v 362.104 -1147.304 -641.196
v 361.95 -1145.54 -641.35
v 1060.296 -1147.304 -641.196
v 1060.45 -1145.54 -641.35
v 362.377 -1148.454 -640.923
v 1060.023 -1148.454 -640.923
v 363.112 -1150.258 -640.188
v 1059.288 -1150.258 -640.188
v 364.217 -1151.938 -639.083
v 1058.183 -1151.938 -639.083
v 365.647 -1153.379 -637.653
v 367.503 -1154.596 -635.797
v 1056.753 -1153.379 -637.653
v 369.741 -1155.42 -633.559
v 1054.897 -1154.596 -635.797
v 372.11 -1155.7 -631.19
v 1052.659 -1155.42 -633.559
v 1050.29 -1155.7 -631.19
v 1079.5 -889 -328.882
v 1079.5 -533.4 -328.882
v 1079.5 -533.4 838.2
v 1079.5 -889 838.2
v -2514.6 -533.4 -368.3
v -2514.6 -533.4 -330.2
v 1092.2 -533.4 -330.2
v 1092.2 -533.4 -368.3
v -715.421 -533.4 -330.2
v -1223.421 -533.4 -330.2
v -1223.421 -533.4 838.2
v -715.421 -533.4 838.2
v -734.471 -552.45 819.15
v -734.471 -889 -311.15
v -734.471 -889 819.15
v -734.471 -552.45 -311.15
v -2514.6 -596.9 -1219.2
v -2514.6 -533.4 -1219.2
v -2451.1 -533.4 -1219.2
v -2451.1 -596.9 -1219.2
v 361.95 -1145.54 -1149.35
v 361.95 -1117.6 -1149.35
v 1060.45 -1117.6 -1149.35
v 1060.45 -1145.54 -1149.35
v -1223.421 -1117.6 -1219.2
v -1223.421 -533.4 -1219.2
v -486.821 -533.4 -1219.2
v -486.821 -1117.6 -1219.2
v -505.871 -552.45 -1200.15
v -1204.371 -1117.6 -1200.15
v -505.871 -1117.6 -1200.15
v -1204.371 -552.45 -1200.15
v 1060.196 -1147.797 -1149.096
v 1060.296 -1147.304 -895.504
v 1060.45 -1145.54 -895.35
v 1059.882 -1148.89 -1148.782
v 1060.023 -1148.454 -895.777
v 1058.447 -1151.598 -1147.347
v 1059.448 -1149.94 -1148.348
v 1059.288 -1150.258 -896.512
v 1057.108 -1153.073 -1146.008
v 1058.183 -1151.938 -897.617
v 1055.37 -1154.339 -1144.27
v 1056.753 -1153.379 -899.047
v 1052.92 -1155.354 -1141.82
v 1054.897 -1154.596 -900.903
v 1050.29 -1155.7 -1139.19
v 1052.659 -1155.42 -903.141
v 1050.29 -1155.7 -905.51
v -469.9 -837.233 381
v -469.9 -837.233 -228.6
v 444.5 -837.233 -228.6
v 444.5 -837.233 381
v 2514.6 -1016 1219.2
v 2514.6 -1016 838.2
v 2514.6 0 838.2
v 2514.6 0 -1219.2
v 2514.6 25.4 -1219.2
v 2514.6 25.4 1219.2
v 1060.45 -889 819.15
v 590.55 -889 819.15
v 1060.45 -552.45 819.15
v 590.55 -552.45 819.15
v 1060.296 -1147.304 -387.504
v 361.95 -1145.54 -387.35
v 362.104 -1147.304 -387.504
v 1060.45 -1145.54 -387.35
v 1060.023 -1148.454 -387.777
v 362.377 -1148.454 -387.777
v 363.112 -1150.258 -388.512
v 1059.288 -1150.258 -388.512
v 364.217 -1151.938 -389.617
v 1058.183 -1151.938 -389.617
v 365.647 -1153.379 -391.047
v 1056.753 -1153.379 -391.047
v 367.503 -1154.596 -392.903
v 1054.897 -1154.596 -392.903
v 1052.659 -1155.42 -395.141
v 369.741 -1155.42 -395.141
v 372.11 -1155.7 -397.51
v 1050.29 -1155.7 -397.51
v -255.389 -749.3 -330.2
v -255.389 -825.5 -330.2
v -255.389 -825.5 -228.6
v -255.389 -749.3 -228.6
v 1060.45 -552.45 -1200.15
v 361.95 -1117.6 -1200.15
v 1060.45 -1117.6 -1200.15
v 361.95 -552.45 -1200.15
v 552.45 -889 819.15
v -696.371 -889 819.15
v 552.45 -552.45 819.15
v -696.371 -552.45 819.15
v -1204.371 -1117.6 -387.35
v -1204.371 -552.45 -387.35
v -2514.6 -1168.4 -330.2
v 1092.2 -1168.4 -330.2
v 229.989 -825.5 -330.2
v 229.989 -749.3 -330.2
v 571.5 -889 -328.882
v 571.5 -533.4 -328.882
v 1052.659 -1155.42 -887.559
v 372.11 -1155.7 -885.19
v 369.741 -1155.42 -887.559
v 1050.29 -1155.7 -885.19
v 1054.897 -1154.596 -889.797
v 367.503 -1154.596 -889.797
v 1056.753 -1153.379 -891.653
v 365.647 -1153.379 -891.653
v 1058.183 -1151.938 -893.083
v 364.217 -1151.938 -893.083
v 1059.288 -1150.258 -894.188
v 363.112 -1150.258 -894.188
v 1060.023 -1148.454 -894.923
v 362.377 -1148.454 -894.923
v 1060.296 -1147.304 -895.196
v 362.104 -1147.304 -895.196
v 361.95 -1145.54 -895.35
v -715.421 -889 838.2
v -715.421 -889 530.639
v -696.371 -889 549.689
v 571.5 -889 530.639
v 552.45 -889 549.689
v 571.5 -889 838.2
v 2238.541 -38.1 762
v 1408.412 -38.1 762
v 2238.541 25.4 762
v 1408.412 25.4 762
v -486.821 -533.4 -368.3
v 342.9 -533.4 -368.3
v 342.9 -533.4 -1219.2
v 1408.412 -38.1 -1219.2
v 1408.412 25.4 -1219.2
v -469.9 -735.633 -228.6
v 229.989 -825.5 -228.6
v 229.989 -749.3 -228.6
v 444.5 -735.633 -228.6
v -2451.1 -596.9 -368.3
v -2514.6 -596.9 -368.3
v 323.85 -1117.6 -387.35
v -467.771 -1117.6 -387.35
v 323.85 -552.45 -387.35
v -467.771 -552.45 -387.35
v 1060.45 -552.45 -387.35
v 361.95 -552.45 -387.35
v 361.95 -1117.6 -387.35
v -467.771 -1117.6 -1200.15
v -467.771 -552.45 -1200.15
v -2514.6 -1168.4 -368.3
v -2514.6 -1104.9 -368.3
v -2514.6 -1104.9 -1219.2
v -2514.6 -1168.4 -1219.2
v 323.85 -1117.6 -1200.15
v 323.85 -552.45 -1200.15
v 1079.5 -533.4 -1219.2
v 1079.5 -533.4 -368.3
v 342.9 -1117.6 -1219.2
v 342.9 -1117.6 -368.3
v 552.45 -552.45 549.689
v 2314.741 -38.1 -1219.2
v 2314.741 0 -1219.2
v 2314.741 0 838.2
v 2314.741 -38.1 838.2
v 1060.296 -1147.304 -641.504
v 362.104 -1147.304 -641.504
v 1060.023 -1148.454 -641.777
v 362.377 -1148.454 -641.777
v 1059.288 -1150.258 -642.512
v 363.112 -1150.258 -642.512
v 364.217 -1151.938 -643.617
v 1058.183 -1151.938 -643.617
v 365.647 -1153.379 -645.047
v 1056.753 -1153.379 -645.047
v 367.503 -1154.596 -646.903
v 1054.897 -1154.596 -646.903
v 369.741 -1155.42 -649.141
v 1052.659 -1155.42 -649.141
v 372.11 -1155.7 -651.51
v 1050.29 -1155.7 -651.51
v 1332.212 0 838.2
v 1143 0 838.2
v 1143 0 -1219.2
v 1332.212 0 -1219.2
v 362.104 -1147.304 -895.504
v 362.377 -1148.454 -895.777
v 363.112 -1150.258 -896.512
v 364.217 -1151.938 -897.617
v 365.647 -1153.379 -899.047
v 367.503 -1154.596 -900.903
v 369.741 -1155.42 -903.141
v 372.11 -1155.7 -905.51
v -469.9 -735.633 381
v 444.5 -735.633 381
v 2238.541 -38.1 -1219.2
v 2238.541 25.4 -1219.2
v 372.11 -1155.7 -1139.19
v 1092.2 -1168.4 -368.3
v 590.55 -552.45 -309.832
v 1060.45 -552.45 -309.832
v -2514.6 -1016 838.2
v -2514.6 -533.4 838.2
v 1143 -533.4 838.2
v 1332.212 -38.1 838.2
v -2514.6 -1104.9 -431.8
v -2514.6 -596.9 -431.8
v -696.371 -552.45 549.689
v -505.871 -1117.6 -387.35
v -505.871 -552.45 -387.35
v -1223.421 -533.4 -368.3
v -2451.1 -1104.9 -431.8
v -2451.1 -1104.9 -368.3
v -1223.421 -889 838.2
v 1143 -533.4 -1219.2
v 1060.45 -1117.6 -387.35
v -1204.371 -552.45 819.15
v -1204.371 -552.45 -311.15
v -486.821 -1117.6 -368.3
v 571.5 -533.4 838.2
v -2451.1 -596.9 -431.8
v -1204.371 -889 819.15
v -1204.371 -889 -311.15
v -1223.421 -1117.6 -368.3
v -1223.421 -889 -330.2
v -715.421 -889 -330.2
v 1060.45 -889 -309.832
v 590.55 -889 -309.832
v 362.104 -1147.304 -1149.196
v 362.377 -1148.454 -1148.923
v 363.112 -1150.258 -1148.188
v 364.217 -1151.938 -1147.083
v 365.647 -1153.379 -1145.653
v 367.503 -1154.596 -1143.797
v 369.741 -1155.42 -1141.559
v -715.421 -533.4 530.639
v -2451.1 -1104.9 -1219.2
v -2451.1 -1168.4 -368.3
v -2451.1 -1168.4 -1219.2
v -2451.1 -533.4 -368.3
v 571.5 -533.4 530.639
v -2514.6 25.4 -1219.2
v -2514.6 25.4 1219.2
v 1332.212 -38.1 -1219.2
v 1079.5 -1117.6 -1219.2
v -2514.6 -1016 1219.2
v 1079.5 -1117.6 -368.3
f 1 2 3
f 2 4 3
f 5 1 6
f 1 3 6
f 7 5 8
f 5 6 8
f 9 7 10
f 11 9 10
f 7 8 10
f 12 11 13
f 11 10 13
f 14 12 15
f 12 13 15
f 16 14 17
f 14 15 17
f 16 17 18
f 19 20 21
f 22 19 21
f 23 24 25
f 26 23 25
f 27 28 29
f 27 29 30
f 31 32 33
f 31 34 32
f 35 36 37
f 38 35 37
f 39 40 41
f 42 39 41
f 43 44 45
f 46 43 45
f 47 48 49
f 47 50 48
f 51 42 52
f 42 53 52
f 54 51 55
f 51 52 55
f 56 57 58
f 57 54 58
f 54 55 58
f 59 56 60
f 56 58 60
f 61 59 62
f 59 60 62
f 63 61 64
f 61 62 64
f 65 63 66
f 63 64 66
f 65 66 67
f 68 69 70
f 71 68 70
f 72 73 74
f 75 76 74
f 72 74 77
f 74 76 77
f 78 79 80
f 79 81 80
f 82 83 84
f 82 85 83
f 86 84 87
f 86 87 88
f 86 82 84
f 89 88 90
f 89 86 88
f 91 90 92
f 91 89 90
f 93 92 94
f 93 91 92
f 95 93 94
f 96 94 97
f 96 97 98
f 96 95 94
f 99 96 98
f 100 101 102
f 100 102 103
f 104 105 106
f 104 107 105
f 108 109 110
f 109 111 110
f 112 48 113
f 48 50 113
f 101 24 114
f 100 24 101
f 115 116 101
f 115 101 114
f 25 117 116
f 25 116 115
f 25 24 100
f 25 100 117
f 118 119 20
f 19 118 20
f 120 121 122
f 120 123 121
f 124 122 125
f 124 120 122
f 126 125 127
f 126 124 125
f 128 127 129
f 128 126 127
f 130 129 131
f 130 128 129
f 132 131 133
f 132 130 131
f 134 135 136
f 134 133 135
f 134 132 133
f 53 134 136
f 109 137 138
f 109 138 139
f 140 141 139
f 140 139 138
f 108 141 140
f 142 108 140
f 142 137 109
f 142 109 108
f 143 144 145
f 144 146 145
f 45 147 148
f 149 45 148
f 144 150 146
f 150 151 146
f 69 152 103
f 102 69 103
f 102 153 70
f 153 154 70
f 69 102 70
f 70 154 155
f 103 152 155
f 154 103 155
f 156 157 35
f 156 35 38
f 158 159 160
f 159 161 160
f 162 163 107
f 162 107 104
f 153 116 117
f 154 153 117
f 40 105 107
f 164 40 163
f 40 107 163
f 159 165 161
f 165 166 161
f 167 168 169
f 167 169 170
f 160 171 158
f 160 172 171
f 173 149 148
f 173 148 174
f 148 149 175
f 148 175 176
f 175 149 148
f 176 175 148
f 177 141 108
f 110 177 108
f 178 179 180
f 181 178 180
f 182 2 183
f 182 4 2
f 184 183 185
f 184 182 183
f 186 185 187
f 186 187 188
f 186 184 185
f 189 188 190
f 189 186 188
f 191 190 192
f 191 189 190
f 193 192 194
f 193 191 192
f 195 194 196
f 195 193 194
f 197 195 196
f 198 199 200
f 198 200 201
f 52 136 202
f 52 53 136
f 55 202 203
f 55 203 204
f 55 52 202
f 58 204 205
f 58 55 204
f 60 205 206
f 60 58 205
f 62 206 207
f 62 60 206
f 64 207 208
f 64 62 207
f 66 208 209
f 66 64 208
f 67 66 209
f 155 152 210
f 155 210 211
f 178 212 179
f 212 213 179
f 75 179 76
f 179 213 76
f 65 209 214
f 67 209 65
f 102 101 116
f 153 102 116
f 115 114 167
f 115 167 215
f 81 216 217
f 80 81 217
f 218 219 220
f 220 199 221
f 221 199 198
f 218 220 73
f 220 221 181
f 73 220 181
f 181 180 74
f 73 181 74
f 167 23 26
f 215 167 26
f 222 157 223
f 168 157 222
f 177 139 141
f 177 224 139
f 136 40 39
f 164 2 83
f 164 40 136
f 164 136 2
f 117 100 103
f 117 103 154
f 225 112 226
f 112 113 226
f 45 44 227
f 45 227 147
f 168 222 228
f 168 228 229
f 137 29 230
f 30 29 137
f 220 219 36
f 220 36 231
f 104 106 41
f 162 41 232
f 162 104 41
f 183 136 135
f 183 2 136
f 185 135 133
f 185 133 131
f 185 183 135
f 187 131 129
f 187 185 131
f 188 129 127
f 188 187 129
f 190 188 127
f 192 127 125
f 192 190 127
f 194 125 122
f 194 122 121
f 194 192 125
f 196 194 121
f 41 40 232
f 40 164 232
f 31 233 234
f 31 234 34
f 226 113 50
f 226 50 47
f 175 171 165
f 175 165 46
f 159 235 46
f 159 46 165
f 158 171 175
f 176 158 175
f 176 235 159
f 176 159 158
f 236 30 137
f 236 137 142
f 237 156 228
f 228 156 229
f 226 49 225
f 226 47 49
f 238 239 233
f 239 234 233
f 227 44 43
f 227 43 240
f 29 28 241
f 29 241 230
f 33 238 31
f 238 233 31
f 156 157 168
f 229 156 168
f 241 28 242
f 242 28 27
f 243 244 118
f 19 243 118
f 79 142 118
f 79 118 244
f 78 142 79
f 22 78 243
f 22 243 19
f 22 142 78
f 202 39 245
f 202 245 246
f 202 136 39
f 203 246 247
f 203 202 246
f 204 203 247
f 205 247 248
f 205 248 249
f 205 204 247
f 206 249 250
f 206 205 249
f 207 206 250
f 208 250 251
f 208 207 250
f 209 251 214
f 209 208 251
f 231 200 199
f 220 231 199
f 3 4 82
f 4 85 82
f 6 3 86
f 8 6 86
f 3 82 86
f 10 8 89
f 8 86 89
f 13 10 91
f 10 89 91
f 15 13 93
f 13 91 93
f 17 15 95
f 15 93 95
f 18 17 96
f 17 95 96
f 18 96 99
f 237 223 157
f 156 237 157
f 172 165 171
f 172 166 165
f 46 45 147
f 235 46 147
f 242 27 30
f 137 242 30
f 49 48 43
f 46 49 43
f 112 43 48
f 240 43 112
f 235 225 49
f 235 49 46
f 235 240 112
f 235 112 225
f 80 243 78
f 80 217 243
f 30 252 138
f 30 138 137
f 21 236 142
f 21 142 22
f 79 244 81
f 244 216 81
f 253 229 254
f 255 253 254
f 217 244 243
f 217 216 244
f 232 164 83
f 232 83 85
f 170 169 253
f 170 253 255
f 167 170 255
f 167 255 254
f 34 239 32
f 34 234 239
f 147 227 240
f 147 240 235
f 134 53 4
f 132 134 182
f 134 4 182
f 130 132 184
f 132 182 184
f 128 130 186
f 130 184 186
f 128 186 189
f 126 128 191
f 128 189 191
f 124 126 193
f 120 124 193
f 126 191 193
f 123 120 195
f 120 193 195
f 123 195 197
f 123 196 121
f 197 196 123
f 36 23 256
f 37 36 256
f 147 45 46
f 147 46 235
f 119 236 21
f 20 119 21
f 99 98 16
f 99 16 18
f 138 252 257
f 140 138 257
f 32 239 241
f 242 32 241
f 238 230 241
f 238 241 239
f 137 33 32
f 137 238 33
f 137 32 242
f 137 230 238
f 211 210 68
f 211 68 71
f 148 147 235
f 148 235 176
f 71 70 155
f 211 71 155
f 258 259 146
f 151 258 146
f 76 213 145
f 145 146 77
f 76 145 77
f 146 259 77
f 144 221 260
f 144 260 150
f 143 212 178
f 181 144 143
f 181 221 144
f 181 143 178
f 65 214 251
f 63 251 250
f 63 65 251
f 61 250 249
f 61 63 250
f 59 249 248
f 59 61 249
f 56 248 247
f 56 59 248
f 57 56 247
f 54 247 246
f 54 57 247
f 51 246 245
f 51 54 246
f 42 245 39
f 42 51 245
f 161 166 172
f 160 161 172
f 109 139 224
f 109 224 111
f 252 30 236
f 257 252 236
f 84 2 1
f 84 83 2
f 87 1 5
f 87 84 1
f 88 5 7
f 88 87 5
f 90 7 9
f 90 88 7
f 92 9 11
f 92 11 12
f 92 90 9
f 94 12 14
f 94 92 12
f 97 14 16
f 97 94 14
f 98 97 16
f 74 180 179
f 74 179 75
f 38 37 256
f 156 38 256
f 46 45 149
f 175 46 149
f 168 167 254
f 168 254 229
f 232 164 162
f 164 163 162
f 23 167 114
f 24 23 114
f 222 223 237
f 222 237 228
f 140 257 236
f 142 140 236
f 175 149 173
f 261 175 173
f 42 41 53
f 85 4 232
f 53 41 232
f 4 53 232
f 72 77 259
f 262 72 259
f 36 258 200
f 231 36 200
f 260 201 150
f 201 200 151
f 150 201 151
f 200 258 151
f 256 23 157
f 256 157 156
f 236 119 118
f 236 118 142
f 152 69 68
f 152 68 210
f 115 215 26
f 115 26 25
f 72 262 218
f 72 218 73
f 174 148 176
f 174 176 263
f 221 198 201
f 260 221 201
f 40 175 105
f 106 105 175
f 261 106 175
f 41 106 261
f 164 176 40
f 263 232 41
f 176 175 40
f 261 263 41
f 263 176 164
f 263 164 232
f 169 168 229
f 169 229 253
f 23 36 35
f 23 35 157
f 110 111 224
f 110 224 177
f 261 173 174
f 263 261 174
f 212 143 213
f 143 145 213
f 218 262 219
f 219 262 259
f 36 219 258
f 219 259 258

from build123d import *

# Parameters (mm, degrees)
F0_W      = 5029.2
F0_H      = 2438.4
F1_DEPTH  = 25.4
F2_W      = 3657.6
F2_H      = 2057.4
F3_DEPTH  = 533.4
F5_DEPTH  = 1016
F6_W      = 830.1289733465
F6_H      = 1981.2
F7_DEPTH  = 25.4
F9_DEPTH  = 38.1
F10_W     = 3606.8
F10_H     = 38.1
F11_DEPTH = 635
F12_W     = 63.5
F12_H     = 850.9
F13_DEPTH = 63.5
F14_W     = 508
F14_H     = 63.5
F15_DEPTH = 63.5
F17_DEPTH = 63.5
F18_W     = 736.6
F18_H     = 850.9
F19_DEPTH = 584.2
F20_T     = -19.05
F21_W     = 829.7205785751
F21_H     = 850.9
F22_DEPTH = 584.2
F23_T     = -19.05
F24_W     = 736.6
F24_H     = 850.9
F25_DEPTH = 584.2
F26_T     = -19.05
F27_W     = 698.5
F27_H     = 254
F28_DEPTH = 38.1
F29_W     = 485.3785143141
F29_H     = 76.2
F30_DEPTH = 101.6
F31_W     = 914.4
F31_H     = 101.6
F32_DEPTH = 609.6
F33_W     = 508
F33_H     = 1167.0816213608
F34_DEPTH = 355.6
F35_T     = -19.05
F36_W     = 508
F36_H     = 1168.4
F37_DEPTH = 355.6
F38_T     = -19.05
F39_W     = 1286.9205785751
F39_H     = 307.5614840508
F40_DEPTH = 355.6
F41_T     = -19.05
F42_R     = 10.16
F43_W     = 698.5
F43_H     = 254
F44_DEPTH = 38.1
F45_R     = 10.15999
F46_W     = 698.5
F46_H     = 254
F47_DEPTH = 38.1
F48_R     = 10.1599


# Not quite as in the source:
# - a fillet or chamfer is up to 0.001 mm smaller than in the source, because OpenCascade refuses the exact size


with BuildPart() as f1:
    # F0 (on Front) → F1 (new body)
    with BuildSketch(Plane.XZ):
        Rectangle(F0_W, F0_H)
    extrude(amount=-F1_DEPTH)

    # F2 (on face) → F3 (join)
    with BuildSketch(Plane.XZ):
        with Locations((-685.8, -190.5)):
            Rectangle(F2_W, F2_H)
    extrude(amount=F3_DEPTH)

    # F4 (on face) → F5 (join)
    with BuildSketch(Plane.XZ):
        Polygon((-2514.6, 1219.2), (-2514.6, 838.2), (1143, 838.2), (2514.6, 838.2), (2514.6, 1219.2), align=None)
    extrude(amount=F5_DEPTH)

    # F6 (on face) → F7 (cut)
    with BuildSketch(Plane.XZ):
        with Locations((1823.4765855578, -228.6)):
            Rectangle(F6_W, F6_H)
    extrude(amount=-F7_DEPTH, mode=Mode.SUBTRACT)

    # F8 (on face) → F9 (join)
    with BuildSketch(Plane.XZ):
        Polygon((2314.7410722311, 838.2), (1332.2120988846, 838.2), (1332.2120988846, -1219.2), (1408.4120988846, -1219.2), (1408.4120988846, 762), (2238.5410722311, 762), (2238.5410722311, -1219.2), (2314.7410722311, -1219.2), align=None)
    extrude(amount=F9_DEPTH)


with BuildPart() as f11:
    # F10 (on face) → F11 (new body)
    with BuildSketch(Plane.XZ.offset(533.4)):
        with Locations((-711.2, -349.25)):
            Rectangle(F10_W, F10_H)
    extrude(amount=F11_DEPTH)

    # F29 (on face) → F30 (join)
    with BuildSketch(Plane.XY.offset(-330.2)):
        with Locations((-12.7, -787.4)):
            Rectangle(F29_W, F29_H)
    extrude(amount=F30_DEPTH)

    # F31 (on face) → F32 (join)
    with BuildSketch(Plane.XY.offset(-228.6)):
        with Locations((-12.7, -786.4327430725)):
            Rectangle(F31_W, F31_H)
    extrude(amount=F32_DEPTH)


with BuildPart() as f13:
    # F12 (on face) → F13 (new body)
    with BuildSketch(Plane.XZ.offset(533.4)):
        with Locations((-2482.85, -793.75)):
            Rectangle(F12_W, F12_H)
    extrude(amount=F13_DEPTH)


with BuildPart() as f15:
    # F14 (on face) → F15 (new body)
    with BuildSketch(Plane(origin=(-2514.6, 0, 0), x_dir=(0, -1, 0), z_dir=(-1, 0, 0))):
        with Locations((850.9, -400.05)):
            Rectangle(F14_W, F14_H)
    extrude(amount=-F15_DEPTH)


with BuildPart() as f17:
    # F16 (on face) → F17 (new body)
    with BuildSketch(Plane(origin=(-2514.6, 0, 0), x_dir=(0, -1, 0), z_dir=(-1, 0, 0))):
        Polygon((1168.4, -368.3), (1104.9, -368.3), (1104.9, -431.8), (1104.9, -1219.2), (1168.4, -1219.2), align=None)
    extrude(amount=-F17_DEPTH)


with BuildPart() as f19:
    # F18 (on face) → F19 (new body)
    with BuildSketch(Plane.XZ.offset(533.4)):
        with Locations((711.2, -793.75)):
            Rectangle(F18_W, F18_H)
    extrude(amount=F19_DEPTH)

    # F20
    f20_openings = [f19.faces().sort_by_distance(p)[0] for p in [
        (711.2, -1117.6, -793.75),
    ]]
    offset(amount=F20_T, openings=f20_openings)



with BuildPart() as f22:
    # F21 (on face) → F22 (new body)
    with BuildSketch(Plane.XZ.offset(533.4)):
        with Locations((-71.9602892876, -793.75)):
            Rectangle(F21_W, F21_H)
    extrude(amount=F22_DEPTH)

    # F23
    f23_openings = [f22.faces().sort_by_distance(p)[0] for p in [
        (-71.960289, -1117.6, -793.75),
    ]]
    offset(amount=F23_T, openings=f23_openings)


with BuildPart() as f25:
    # F24 (on face) → F25 (new body)
    with BuildSketch(Plane.XZ.offset(533.4)):
        with Locations((-855.1205785751, -793.75)):
            Rectangle(F24_W, F24_H)
    extrude(amount=F25_DEPTH)

    # F26
    f26_openings = [f25.faces().sort_by_distance(p)[0] for p in [
        (-855.120579, -1117.6, -793.75),
    ]]
    offset(amount=F26_T, openings=f26_openings)


with BuildPart() as f28:
    # F27 (on face) → F28 (new body)
    with BuildSketch(Plane.XZ.offset(1117.6)):
        with Locations((711.2, -514.35)):
            Rectangle(F27_W, F27_H)
    extrude(amount=F28_DEPTH)

    # F42
    f42_edges = [f28.edges().sort_by_distance(p)[0] for p in [
        (711.2, -1155.7, -387.35),
        (361.95, -1155.7, -514.35),
        (711.2, -1155.7, -641.35),
        (1060.45, -1155.7, -514.35),
    ]]
    fillet(f42_edges, radius=F42_R)


with BuildPart() as f34:
    # F33 (on face) → F34 (new body)
    with BuildSketch(Plane.XZ.offset(533.4)):
        with Locations((825.5, 254.6591893196)):
            Rectangle(F33_W, F33_H)
    extrude(amount=F34_DEPTH)

    # F35
    f35_openings = [f34.faces().sort_by_distance(p)[0] for p in [
        (825.5, -889, 254.659189),
    ]]
    offset(amount=F35_T, openings=f35_openings)


with BuildPart() as f37:
    # F36 (on face) → F37 (new body)
    with BuildSketch(Plane.XZ.offset(533.4)):
        with Locations((-969.4205785751, 254)):
            Rectangle(F36_W, F36_H)
    extrude(amount=F37_DEPTH)

    # F38
    f38_openings = [f37.faces().sort_by_distance(p)[0] for p in [
        (-969.420579, -889, 254),
    ]]
    offset(amount=F38_T, openings=f38_openings)


with BuildPart() as f40:
    # F39 (on face) → F40 (new body)
    with BuildSketch(Plane.XZ.offset(533.4)):
        with Locations((-71.9602892876, 684.4192579746)):
            Rectangle(F39_W, F39_H)
    extrude(amount=F40_DEPTH)

    # F41
    f41_openings = [f40.faces().sort_by_distance(p)[0] for p in [
        (-71.960289, -889, 684.419258),
    ]]
    offset(amount=F41_T, openings=f41_openings)


with BuildPart() as f19_1:
    add(f19.part)

    add(f28.part)  # F44 merges F28
    # F43 (on face) → F44 (join)
    with BuildSketch(Plane.XZ.offset(1117.6)):
        with Locations((711.2, -768.35)):
            Rectangle(F43_W, F43_H)
    extrude(amount=F44_DEPTH)

    # F45 (radius 10.16 in the source; OpenCascade refuses exactly that, so slightly less here)
    f45_edges = [f19_1.edges().sort_by_distance(p)[0] for p in [
        (1060.45, -1155.7, -768.35),
        (711.2, -1155.7, -641.35),
        (361.95, -1155.7, -768.35),
        (711.2, -1155.7, -895.35),
    ]]
    fillet(f45_edges, radius=F45_R)

    # F46 (on face) → F47 (join)
    with BuildSketch(Plane.XZ.offset(1117.6)):
        with Locations((711.2, -1022.35)):
            Rectangle(F46_W, F46_H)
    extrude(amount=F47_DEPTH)

    # F48 (radius 10.16 in the source; OpenCascade refuses exactly that, so slightly less here)
    f48_edges = [f19_1.edges().sort_by_distance(p)[0] for p in [
        (711.2, -1155.7, -895.35),
        (361.95, -1155.7, -1022.35),
        (711.2, -1155.7, -1149.35),
        (1060.45, -1155.7, -1022.35),
    ]]
    fillet(f48_edges, radius=F48_R)


solid = Compound([f1.part, f11.part, f13.part, f15.part, f17.part, f22.part, f25.part, f34.part, f37.part, f40.part, f19_1.part])
